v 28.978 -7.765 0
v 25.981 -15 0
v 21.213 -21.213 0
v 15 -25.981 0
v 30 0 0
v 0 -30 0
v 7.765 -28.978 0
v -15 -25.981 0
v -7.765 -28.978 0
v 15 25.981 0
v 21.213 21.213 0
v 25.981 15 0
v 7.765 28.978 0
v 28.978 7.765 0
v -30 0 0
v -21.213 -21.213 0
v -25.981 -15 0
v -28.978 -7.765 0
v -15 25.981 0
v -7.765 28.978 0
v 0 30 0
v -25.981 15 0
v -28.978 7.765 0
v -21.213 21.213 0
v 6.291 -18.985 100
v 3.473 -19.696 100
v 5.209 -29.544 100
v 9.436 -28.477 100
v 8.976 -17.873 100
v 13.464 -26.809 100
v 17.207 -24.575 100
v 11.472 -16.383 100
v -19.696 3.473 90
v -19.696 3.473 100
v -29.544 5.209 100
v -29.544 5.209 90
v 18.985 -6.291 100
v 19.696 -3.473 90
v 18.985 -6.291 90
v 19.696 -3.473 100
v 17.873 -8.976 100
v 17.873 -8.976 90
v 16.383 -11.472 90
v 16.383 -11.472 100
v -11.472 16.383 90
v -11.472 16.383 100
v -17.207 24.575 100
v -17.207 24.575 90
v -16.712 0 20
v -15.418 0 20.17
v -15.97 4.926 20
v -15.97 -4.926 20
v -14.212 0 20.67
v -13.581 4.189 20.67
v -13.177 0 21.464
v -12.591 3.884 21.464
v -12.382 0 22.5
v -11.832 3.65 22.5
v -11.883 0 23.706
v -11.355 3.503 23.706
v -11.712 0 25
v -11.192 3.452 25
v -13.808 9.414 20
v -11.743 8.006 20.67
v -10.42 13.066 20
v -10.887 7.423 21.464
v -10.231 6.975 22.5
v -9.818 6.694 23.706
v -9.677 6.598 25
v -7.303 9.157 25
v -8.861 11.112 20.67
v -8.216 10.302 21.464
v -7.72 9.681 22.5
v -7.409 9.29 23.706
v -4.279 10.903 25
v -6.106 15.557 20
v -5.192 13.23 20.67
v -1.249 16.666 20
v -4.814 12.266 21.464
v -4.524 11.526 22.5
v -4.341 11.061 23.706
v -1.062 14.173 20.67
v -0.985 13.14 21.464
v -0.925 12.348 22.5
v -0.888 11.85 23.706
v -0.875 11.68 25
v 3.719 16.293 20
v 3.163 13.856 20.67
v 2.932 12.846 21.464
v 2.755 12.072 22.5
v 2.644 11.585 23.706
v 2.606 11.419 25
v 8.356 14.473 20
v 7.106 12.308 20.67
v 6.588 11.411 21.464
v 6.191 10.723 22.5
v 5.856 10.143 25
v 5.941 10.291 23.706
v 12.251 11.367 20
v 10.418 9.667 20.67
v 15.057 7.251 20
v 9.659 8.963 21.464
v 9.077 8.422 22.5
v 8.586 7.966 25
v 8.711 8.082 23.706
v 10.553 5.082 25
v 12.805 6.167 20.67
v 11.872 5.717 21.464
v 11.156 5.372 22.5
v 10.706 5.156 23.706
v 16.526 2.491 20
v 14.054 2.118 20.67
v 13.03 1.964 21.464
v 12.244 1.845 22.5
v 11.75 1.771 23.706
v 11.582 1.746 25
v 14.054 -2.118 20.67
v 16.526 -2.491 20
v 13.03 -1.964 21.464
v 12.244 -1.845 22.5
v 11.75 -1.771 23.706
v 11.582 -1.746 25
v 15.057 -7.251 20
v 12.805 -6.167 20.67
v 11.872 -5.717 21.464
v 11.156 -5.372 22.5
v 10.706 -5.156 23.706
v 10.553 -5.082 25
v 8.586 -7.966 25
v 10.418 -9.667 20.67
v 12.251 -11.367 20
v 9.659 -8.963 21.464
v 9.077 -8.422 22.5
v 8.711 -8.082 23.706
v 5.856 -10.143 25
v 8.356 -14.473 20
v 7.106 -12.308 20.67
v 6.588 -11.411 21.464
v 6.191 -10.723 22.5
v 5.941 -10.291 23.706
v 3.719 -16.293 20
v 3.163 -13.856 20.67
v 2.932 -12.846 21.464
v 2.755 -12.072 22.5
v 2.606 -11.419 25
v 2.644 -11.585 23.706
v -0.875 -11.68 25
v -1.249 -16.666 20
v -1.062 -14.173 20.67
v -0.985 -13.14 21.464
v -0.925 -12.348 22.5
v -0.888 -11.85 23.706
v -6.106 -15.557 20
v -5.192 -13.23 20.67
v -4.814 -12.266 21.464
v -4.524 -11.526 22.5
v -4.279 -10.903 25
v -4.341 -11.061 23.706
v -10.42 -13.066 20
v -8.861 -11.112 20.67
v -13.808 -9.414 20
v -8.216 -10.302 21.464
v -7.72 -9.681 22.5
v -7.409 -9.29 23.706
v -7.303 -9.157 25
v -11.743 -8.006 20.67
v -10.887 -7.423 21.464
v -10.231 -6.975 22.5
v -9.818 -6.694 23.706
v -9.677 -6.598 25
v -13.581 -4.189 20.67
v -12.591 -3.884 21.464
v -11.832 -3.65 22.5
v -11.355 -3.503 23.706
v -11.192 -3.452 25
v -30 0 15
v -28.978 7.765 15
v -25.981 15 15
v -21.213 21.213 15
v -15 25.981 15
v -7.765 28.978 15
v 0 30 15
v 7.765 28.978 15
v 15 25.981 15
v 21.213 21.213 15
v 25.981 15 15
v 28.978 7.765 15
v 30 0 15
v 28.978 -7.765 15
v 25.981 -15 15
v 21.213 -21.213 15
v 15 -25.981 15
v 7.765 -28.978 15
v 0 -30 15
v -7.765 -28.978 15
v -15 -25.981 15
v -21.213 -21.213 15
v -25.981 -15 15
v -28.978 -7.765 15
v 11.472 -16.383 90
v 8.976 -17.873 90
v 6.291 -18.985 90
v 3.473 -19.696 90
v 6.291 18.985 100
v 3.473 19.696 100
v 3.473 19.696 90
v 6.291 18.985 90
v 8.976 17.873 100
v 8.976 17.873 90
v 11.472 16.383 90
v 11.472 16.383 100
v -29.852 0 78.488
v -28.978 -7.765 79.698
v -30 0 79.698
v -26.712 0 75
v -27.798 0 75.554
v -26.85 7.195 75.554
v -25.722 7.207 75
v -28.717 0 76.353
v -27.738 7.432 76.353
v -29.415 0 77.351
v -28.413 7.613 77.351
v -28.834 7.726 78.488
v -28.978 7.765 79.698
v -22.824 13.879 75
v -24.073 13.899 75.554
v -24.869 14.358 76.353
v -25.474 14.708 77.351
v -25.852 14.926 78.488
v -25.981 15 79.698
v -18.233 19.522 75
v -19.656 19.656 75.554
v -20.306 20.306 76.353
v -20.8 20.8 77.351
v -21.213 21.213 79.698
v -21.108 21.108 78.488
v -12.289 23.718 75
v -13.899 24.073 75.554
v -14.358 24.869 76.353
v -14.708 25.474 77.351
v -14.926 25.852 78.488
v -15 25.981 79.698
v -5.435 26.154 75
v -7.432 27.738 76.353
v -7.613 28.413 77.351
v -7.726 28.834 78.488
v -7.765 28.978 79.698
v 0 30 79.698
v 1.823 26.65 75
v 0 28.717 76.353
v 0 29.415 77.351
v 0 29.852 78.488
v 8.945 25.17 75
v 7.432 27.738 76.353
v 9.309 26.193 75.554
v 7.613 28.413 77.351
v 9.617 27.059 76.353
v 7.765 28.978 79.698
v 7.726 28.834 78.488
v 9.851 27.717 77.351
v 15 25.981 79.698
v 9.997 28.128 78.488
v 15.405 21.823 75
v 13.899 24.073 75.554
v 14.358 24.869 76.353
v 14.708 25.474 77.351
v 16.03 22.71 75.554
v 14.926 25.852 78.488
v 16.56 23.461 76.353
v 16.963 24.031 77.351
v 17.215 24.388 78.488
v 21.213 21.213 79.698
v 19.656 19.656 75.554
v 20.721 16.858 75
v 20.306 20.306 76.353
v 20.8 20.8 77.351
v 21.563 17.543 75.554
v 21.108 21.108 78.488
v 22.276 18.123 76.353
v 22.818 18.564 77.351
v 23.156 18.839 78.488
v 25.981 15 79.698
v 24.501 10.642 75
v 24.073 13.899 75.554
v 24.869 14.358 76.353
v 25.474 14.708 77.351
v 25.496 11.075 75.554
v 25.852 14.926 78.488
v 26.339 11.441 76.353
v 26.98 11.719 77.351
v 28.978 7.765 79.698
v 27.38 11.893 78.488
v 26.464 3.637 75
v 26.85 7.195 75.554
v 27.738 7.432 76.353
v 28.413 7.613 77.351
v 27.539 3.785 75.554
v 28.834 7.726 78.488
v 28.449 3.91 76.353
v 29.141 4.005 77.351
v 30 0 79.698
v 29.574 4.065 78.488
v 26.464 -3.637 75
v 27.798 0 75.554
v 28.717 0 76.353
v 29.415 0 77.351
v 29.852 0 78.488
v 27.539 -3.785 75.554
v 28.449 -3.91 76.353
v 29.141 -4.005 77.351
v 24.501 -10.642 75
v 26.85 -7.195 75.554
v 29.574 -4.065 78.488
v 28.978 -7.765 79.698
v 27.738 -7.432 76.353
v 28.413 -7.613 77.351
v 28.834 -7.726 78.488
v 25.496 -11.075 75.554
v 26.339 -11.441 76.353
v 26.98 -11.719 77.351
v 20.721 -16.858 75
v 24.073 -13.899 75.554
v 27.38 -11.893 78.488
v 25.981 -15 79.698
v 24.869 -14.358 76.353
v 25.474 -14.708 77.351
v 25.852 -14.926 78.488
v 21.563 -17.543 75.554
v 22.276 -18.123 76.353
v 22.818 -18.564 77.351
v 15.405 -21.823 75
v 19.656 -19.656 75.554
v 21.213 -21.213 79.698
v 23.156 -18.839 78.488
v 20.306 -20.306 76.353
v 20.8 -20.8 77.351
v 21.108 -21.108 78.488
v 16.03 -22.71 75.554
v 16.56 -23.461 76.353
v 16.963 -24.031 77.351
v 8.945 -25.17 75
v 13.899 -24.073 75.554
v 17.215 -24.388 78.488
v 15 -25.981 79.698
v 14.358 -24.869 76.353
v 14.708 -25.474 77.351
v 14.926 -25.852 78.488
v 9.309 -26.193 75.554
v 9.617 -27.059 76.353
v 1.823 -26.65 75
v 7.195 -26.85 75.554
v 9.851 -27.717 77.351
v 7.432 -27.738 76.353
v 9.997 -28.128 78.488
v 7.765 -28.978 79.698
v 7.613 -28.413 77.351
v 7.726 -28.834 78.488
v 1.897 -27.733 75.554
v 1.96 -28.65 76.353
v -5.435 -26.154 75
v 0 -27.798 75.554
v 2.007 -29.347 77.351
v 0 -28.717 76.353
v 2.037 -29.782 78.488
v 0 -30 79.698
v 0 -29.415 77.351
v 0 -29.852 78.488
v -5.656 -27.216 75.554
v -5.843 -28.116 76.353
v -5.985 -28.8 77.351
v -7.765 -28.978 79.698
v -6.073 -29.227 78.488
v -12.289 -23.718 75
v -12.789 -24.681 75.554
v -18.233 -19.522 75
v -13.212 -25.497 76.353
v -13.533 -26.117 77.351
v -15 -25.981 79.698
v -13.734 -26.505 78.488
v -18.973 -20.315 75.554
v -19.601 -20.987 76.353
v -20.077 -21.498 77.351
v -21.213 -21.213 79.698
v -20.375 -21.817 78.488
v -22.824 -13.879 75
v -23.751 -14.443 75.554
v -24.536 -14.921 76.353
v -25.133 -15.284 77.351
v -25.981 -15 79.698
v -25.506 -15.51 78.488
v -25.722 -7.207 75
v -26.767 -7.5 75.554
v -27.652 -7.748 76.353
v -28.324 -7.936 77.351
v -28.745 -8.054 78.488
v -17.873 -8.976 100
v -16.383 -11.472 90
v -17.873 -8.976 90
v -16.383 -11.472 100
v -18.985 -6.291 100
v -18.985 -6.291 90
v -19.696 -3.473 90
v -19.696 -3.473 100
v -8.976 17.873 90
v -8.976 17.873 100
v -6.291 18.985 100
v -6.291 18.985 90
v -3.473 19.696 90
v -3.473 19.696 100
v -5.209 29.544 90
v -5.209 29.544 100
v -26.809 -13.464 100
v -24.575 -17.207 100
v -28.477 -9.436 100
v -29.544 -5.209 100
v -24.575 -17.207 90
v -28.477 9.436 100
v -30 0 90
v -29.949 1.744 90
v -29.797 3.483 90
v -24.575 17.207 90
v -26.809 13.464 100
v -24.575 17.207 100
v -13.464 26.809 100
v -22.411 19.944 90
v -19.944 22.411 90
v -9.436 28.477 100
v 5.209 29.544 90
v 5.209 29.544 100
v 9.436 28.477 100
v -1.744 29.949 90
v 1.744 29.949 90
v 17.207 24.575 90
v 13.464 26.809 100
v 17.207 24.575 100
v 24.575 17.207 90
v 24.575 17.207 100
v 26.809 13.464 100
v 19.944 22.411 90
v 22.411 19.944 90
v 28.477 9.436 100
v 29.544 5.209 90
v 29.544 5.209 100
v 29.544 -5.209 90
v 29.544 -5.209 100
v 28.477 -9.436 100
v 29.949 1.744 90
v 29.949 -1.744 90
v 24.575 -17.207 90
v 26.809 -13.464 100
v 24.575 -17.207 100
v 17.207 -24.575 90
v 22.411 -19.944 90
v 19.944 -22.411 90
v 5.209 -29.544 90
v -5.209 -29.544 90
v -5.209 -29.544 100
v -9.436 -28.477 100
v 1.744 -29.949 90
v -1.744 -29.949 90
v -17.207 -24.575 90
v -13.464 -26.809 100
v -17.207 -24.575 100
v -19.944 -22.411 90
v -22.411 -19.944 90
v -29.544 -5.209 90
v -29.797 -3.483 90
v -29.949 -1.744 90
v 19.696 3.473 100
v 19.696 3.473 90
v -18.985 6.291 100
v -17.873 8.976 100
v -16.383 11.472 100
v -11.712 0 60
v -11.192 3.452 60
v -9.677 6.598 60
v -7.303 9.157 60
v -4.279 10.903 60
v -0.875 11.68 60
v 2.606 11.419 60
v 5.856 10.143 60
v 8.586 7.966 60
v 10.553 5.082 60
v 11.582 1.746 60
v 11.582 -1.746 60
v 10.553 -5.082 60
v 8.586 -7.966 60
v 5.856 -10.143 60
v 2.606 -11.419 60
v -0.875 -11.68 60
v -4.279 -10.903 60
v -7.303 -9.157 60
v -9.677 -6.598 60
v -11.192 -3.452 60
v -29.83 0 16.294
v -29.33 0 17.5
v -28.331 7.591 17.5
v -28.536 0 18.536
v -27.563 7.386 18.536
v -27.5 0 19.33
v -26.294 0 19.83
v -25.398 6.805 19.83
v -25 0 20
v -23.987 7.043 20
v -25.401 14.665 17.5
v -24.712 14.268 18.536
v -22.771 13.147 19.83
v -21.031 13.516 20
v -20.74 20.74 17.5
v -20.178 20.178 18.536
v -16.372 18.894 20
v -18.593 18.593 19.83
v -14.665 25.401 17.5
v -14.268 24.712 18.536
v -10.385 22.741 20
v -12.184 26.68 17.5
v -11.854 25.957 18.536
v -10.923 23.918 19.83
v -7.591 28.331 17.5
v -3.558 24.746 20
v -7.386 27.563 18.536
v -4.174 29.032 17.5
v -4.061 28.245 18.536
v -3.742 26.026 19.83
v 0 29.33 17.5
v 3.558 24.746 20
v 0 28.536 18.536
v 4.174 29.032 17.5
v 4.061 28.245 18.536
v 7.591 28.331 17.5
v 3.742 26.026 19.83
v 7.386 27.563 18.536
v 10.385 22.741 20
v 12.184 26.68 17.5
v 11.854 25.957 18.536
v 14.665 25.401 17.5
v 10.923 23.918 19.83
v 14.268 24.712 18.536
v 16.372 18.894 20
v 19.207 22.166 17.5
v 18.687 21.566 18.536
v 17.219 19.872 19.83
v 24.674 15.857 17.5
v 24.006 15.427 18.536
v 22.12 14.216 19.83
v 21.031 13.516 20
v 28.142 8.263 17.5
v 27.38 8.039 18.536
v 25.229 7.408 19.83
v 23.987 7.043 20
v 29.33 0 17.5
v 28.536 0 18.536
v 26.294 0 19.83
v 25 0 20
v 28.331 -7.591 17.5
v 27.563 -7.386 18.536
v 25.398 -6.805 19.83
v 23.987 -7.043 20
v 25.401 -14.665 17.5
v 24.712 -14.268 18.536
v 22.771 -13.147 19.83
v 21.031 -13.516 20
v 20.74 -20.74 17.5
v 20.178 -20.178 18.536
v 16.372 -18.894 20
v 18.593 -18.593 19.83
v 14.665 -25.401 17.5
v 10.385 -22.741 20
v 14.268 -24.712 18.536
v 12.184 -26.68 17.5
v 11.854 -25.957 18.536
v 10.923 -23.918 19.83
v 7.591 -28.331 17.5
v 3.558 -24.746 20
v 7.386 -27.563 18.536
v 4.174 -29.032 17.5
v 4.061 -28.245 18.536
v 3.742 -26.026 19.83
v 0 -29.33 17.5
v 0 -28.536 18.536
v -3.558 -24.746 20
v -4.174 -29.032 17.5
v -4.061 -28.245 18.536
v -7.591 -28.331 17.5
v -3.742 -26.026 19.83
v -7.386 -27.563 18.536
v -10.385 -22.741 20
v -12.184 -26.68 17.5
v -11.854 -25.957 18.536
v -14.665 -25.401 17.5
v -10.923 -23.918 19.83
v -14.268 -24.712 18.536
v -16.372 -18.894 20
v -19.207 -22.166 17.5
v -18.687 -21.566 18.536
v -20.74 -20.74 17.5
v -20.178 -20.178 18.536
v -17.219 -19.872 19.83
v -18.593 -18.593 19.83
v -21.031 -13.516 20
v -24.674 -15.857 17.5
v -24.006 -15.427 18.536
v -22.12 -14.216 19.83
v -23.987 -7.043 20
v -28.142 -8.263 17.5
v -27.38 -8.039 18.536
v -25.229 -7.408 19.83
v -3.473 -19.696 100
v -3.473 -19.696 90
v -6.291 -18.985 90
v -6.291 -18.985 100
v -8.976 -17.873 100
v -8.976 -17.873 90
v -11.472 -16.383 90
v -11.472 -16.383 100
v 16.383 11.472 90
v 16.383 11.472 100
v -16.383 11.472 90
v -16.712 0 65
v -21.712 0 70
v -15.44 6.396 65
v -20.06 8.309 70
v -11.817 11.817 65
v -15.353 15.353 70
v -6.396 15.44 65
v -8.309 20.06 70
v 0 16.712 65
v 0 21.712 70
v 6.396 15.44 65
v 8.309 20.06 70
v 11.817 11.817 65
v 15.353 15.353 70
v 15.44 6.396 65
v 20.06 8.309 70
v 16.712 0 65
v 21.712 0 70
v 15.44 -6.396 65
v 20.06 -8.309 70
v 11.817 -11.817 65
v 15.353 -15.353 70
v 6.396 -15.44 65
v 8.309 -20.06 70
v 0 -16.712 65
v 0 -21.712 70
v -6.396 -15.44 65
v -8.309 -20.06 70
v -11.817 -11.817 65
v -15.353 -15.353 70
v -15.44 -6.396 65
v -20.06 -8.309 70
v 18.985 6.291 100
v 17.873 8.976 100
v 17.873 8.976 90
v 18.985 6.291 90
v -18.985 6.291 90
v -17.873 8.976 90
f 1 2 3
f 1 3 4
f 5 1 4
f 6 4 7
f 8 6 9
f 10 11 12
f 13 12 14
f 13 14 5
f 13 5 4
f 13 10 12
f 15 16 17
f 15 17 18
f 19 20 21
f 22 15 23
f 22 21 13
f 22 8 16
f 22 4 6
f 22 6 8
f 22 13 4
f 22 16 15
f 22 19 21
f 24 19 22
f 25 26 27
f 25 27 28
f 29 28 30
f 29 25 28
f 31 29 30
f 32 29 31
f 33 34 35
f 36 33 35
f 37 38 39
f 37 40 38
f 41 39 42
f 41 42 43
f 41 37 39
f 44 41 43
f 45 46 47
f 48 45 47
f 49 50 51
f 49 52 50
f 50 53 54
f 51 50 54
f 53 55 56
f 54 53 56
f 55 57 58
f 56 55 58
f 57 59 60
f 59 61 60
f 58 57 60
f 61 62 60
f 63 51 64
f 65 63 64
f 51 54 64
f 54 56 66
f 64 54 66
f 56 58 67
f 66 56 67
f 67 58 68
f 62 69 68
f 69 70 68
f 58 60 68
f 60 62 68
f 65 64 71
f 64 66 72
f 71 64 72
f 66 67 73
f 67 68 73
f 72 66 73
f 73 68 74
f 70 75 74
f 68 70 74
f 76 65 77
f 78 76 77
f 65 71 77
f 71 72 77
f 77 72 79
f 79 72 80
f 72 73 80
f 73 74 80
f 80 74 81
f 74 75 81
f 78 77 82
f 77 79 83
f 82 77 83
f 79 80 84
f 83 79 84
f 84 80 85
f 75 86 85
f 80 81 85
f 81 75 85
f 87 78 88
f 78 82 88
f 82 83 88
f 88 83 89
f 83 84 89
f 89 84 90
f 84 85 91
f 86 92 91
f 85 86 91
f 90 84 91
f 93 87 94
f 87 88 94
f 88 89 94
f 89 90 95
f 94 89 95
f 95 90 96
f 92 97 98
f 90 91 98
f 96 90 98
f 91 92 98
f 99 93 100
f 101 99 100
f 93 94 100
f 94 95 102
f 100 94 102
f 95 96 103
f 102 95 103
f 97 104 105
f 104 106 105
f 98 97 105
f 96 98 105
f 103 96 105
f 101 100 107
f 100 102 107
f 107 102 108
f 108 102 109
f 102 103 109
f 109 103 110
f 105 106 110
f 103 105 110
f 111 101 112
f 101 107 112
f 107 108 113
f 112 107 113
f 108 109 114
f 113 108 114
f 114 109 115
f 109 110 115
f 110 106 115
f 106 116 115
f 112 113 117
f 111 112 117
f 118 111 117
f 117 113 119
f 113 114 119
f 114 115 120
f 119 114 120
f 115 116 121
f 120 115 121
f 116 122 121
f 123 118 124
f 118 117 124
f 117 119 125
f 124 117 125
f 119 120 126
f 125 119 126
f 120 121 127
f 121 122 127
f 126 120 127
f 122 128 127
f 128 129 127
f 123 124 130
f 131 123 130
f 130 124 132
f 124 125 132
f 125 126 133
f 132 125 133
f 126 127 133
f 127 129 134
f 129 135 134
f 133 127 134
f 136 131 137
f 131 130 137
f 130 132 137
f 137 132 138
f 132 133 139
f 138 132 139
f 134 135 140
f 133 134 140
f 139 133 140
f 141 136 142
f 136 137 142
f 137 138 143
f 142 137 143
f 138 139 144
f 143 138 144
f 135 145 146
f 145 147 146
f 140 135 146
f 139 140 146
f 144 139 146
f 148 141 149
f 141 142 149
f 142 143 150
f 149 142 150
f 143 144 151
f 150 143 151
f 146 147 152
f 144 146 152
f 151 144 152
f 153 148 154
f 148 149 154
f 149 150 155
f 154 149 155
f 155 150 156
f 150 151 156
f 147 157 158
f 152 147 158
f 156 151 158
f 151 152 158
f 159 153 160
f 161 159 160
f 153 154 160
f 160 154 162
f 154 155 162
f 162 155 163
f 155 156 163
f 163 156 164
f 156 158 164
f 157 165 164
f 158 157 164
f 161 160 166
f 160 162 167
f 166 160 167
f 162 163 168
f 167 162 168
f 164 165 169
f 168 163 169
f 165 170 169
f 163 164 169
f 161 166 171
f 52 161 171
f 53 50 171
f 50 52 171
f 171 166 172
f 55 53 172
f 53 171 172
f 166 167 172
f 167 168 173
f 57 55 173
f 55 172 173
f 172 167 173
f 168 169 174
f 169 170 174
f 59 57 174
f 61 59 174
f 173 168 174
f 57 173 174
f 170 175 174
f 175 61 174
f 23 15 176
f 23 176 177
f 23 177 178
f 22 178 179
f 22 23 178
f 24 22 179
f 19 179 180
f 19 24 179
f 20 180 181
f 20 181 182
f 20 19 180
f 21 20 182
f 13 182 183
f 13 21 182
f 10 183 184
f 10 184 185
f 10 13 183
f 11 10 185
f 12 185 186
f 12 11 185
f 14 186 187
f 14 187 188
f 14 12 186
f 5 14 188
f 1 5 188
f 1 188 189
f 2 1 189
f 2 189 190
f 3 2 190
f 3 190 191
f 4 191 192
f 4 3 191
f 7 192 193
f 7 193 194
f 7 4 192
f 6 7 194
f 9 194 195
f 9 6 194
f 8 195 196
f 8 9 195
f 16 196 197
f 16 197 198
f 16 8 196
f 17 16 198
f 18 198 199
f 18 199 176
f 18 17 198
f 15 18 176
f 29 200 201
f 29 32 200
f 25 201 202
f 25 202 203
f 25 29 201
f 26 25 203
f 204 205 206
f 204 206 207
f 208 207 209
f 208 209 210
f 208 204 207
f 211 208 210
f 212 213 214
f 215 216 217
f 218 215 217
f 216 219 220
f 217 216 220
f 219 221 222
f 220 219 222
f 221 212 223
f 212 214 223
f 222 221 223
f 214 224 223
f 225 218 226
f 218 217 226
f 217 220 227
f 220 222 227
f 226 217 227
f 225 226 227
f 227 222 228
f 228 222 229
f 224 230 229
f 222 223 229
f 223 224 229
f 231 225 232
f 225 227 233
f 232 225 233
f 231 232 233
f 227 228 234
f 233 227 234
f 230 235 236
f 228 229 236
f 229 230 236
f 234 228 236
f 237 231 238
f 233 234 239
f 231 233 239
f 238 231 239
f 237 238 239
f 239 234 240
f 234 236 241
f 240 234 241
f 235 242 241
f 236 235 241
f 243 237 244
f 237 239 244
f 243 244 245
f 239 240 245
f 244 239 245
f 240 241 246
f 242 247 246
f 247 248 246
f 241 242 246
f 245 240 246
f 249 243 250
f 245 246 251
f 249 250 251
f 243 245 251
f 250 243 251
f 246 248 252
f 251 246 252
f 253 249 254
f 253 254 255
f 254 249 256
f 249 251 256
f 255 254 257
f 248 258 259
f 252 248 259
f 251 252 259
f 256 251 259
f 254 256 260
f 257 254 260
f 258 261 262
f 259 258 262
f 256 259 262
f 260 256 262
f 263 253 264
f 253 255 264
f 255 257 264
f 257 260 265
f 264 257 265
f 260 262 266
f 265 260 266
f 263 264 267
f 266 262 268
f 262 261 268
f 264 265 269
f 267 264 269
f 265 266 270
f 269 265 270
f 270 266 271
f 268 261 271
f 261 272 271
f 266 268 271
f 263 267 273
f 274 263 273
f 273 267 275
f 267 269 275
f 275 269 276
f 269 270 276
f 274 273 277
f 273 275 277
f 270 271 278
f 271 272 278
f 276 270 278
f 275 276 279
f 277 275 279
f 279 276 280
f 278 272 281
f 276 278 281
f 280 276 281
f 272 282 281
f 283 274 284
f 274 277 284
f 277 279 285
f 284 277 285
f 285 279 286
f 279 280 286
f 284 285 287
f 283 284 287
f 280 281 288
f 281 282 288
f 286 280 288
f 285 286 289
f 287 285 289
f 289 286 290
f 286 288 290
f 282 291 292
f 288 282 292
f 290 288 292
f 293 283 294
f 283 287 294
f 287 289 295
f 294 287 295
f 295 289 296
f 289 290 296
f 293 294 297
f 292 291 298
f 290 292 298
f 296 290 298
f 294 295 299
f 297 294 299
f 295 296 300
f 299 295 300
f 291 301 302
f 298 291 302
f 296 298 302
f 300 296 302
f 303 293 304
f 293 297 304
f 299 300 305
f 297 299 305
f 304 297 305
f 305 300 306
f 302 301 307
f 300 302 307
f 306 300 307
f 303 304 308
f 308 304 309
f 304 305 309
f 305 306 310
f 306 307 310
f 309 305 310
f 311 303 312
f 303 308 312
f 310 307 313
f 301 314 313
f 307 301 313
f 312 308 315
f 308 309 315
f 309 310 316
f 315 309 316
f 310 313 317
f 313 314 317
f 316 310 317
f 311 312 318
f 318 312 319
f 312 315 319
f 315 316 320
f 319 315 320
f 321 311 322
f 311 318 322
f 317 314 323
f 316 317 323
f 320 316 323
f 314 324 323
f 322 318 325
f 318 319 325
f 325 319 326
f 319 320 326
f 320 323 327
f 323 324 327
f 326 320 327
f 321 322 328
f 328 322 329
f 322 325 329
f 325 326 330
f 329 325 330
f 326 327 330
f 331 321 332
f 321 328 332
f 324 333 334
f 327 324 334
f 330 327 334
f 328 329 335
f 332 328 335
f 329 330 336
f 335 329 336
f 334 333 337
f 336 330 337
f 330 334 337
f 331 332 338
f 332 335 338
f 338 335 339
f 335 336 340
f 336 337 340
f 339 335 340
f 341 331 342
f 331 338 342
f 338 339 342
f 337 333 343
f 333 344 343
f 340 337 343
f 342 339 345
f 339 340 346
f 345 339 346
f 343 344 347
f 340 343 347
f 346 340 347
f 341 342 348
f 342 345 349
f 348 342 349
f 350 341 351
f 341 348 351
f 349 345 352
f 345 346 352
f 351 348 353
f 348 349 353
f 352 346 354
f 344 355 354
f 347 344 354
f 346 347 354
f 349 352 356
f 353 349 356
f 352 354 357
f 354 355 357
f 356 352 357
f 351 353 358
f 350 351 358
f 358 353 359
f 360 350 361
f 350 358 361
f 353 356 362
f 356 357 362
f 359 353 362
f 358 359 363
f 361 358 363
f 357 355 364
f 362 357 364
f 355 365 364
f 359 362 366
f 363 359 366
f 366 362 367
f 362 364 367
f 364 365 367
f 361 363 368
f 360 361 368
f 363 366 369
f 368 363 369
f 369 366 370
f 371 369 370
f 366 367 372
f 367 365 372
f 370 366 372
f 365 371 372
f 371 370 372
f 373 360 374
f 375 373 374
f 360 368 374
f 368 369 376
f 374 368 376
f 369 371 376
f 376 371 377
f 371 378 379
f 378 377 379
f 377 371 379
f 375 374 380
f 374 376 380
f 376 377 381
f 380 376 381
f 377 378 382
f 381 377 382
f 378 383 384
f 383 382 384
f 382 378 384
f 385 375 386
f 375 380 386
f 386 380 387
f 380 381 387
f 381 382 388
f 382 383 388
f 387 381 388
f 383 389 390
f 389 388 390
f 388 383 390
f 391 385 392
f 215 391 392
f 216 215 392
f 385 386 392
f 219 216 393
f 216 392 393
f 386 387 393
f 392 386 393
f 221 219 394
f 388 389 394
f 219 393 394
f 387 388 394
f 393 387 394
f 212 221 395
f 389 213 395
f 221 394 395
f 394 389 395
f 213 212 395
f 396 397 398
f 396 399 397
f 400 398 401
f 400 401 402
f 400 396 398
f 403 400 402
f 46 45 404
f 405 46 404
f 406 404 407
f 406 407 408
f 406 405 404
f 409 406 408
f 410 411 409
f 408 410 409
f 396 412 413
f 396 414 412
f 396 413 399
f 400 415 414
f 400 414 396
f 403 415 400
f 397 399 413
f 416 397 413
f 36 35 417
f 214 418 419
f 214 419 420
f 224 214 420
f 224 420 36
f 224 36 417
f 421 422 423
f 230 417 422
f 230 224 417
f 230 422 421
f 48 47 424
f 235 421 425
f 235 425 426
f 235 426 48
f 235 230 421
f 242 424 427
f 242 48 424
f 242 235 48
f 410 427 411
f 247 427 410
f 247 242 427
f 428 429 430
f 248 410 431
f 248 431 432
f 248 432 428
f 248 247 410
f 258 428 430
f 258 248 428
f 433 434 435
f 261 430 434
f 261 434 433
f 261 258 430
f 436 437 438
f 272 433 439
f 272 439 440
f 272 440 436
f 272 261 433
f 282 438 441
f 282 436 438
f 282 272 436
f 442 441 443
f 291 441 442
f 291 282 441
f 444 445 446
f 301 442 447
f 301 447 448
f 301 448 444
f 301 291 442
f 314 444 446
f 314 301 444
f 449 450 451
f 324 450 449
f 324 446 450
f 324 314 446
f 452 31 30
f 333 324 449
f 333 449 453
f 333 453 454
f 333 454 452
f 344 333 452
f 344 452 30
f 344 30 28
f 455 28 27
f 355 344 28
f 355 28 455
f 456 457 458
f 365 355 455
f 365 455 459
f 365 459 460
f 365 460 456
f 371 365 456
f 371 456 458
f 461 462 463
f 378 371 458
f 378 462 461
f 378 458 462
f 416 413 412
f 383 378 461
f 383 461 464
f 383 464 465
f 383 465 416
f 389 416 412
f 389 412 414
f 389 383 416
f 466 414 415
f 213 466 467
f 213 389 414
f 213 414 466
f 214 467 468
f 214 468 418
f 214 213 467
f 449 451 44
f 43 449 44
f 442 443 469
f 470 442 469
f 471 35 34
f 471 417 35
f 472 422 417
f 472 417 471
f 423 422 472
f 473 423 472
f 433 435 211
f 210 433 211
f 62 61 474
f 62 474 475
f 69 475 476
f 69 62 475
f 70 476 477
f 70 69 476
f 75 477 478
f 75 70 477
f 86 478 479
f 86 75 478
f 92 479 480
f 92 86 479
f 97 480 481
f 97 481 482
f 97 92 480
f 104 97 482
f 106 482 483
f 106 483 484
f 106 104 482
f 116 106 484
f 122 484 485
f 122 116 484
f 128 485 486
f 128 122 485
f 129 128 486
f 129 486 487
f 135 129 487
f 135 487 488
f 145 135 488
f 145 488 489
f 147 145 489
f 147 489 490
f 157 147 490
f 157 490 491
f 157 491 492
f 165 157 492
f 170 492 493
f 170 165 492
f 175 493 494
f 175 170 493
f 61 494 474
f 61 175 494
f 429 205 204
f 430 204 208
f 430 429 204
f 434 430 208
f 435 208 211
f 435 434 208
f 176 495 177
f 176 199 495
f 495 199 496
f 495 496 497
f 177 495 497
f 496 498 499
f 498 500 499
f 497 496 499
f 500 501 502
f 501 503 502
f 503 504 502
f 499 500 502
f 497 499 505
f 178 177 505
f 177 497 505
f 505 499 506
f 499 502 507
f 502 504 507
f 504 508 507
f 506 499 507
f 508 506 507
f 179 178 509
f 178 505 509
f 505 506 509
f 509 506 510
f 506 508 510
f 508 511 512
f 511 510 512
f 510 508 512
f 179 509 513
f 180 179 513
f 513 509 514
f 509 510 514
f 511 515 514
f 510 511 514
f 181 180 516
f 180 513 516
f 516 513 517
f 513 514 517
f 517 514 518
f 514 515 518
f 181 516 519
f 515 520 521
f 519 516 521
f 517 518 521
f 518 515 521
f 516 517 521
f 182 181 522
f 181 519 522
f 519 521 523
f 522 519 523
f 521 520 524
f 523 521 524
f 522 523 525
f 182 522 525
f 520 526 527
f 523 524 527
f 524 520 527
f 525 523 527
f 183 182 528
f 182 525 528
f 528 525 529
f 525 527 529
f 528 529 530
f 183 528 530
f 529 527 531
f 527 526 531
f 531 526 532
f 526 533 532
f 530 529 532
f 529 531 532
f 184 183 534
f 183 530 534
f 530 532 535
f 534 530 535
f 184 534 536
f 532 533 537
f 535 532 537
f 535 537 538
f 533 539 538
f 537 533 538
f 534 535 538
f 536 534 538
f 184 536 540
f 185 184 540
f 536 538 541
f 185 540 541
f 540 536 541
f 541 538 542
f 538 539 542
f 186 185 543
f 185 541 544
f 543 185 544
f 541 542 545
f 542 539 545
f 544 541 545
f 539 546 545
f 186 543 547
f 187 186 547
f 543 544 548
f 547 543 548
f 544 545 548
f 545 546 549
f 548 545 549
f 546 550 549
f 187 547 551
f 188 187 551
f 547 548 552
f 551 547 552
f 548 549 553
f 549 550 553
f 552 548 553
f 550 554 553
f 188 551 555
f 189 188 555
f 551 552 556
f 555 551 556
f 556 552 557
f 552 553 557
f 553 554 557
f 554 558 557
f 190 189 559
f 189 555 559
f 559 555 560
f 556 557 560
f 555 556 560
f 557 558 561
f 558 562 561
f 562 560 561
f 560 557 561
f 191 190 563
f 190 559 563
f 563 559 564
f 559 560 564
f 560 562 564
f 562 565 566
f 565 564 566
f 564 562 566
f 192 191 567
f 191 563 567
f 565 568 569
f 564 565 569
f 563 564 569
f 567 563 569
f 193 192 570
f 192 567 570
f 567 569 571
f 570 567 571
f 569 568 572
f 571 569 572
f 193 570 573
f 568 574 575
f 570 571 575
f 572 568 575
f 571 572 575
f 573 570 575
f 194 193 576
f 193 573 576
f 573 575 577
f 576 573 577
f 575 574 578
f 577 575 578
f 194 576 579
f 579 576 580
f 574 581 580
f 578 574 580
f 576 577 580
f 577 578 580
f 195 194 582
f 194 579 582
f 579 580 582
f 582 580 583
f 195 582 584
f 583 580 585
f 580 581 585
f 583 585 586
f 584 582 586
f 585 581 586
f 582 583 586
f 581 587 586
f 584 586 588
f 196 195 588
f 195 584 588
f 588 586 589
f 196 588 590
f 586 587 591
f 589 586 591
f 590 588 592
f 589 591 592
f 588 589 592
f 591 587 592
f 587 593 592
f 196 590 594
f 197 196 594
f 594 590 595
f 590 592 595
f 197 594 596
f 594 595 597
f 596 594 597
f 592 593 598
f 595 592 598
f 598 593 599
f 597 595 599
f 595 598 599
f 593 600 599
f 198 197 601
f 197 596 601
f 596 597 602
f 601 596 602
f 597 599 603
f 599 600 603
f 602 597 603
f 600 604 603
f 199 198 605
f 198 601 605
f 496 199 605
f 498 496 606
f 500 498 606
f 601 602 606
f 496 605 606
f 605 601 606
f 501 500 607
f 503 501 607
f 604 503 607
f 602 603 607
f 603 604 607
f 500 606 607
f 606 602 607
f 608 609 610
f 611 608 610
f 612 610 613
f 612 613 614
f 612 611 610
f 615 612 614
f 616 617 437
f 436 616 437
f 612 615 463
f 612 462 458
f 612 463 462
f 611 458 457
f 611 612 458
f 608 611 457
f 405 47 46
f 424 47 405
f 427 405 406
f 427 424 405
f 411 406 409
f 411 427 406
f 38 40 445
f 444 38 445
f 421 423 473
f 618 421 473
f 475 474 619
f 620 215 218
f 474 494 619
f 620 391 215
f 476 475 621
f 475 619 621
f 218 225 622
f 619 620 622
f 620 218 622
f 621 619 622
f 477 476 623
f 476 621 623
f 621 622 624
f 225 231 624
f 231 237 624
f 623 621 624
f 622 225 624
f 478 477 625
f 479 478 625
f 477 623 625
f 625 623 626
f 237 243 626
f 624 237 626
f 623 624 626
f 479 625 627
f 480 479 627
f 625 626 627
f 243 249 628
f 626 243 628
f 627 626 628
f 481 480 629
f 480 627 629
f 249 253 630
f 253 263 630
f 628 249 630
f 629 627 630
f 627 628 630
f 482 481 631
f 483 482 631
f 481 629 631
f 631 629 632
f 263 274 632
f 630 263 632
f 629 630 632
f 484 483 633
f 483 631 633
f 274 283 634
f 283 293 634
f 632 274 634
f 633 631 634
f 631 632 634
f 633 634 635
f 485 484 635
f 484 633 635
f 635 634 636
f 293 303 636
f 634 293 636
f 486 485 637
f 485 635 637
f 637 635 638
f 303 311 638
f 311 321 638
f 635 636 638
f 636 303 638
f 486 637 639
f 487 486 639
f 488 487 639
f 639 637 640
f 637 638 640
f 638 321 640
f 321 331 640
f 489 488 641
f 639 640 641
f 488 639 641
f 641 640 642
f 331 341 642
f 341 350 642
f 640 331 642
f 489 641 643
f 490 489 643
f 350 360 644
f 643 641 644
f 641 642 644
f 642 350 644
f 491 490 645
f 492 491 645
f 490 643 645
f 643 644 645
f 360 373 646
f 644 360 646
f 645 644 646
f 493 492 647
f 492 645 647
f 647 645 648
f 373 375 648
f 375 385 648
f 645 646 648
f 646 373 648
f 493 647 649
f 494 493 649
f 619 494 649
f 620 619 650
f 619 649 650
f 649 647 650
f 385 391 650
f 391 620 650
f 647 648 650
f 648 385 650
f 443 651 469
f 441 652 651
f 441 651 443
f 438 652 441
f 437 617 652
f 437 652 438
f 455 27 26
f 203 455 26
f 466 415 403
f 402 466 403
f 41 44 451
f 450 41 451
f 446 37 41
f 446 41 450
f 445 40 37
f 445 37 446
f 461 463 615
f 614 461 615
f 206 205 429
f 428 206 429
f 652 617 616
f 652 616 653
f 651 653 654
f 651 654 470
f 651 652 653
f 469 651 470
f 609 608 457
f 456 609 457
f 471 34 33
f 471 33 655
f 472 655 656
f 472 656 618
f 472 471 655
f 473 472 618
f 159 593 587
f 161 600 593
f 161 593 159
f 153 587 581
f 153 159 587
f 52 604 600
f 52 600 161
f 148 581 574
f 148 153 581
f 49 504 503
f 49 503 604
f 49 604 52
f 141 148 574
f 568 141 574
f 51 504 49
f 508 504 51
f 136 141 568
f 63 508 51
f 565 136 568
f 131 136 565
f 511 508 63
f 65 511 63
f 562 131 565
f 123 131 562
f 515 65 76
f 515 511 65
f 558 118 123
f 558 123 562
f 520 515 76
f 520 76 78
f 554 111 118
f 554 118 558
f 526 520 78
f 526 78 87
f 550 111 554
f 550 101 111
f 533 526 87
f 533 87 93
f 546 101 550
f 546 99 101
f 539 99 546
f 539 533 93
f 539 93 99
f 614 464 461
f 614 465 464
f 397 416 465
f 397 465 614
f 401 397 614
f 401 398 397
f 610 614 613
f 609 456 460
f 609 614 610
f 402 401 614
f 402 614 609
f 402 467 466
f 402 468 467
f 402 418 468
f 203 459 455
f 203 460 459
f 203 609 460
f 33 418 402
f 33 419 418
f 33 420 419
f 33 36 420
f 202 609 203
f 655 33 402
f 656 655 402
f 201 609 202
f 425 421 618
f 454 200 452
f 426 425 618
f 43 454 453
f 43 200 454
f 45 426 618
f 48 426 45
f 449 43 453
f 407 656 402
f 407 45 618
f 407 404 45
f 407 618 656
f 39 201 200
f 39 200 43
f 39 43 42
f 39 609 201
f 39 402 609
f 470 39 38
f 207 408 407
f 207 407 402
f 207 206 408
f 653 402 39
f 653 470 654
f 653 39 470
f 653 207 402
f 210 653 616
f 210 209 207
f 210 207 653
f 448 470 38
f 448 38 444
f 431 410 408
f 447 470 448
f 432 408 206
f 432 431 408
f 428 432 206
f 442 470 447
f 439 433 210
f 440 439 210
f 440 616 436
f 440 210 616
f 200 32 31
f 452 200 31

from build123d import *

# Parameters (mm, degrees)
F3_DEPTH = 10
F4_R     = 5
F5_SIZE  = 15


# Not quite as in the source:
# - a fillet or chamfer that OpenCascade refuses, or shapes differently, is made with other operations: its cross-section is extruded or revolved along the edge and cut away or added


with BuildPart() as f1:
    # F0 (on Front) → F1 (revolve)
    with BuildSketch(Plane.XZ):
        Polygon((-30, 0), (0, 0), (0, 90), (-20, 90), (-20, 100), (-30, 100), (-30, 75), (-11.7123959959, 75), (-11.7123959959, 20), (-30, 20), align=None)
    revolve(axis=Axis((0, 0, 45), (0, 0, -1)))

    # F2 (on face) → F3 (cut)
    with BuildSketch(Plane.XY.offset(100)):
        with BuildLine():
            ThreePointArc((-3.2492678477, 18.4275136719), (0, 18.7117877734), (3.2492678477, 18.4275136719))
            Line((3.2492678477, 18.4275136719), (5.5579839553, 31.5208933594))
            ThreePointArc((5.5579839553, 31.5208933594), (0, 32.0071539476), (-5.5579839553, 31.5208933594))
            Line((-5.5579839553, 31.5208933594), (-3.2492678477, 18.4275136719))
        make_face()
        with BuildLine():
            ThreePointArc((-15.3277992068, 10.7326405488), (-13.2312320227, 13.2312320227), (-10.7326405488, 15.3277992068))
            Line((-10.7326405488, 15.3277992068), (-18.358549299, 26.218725588))
            ThreePointArc((-18.358549299, 26.218725588), (-22.6324756028, 22.6324756028), (-26.218725588, 18.358549299))
            Line((-26.218725588, 18.358549299), (-15.3277992068, 10.7326405488))
        make_face()
        with BuildLine():
            ThreePointArc((-18.4275136719, -3.2492678477), (-18.7117877734, 0), (-18.4275136719, 3.2492678477))
            Line((-18.4275136719, 3.2492678477), (-31.5208933594, 5.5579839553))
            ThreePointArc((-31.5208933594, 5.5579839553), (-32.0071539476, 0), (-31.5208933594, -5.5579839553))
            Line((-31.5208933594, -5.5579839553), (-18.4275136719, -3.2492678477))
        make_face()
        with BuildLine():
            ThreePointArc((-10.7326405488, -15.3277992068), (-13.2312320227, -13.2312320227), (-15.3277992068, -10.7326405488))
            Line((-15.3277992068, -10.7326405488), (-26.218725588, -18.358549299))
            ThreePointArc((-26.218725588, -18.358549299), (-22.6324756028, -22.6324756028), (-18.358549299, -26.218725588))
            Line((-18.358549299, -26.218725588), (-10.7326405488, -15.3277992068))
        make_face()
        with BuildLine():
            ThreePointArc((3.2492678477, -18.4275136719), (0, -18.7117877734), (-3.2492678477, -18.4275136719))
            Line((-3.2492678477, -18.4275136719), (-5.5579839553, -31.5208933594))
            ThreePointArc((-5.5579839553, -31.5208933594), (0, -32.0071539476), (5.5579839553, -31.5208933594))
            Line((5.5579839553, -31.5208933594), (3.2492678477, -18.4275136719))
        make_face()
        with BuildLine():
            ThreePointArc((15.3277992068, -10.7326405488), (13.2312320227, -13.2312320227), (10.7326405488, -15.3277992068))
            Line((10.7326405488, -15.3277992068), (18.358549299, -26.218725588))
            ThreePointArc((18.358549299, -26.218725588), (22.6324756028, -22.6324756028), (26.218725588, -18.358549299))
            Line((26.218725588, -18.358549299), (15.3277992068, -10.7326405488))
        make_face()
        with BuildLine():
            ThreePointArc((18.4275136719, 3.2492678477), (18.7117877734, 0), (18.4275136719, -3.2492678477))
            Line((18.4275136719, -3.2492678477), (31.5208933594, -5.5579839553))
            ThreePointArc((31.5208933594, -5.5579839553), (32.0071539476, 0), (31.5208933594, 5.5579839553))
            Line((31.5208933594, 5.5579839553), (18.4275136719, 3.2492678477))
        make_face()
        with BuildLine():
            ThreePointArc((10.7326405488, 15.3277992068), (13.2312320227, 13.2312320227), (15.3277992068, 10.7326405488))
            Line((15.3277992068, 10.7326405488), (26.218725588, 18.358549299))
            ThreePointArc((26.218725588, 18.358549299), (22.6324756028, 22.6324756028), (18.358549299, 26.218725588))
            Line((18.358549299, 26.218725588), (10.7326405488, 15.3277992068))
        make_face()
    extrude(amount=-F3_DEPTH, mode=Mode.SUBTRACT)

    # F4
    f4_edges = [f1.edges().sort_by_distance(p)[0] for p in [
        (11.712396, 0, 20),
        (30, 0, 20),
    ]]
    fillet(f4_edges, radius=F4_R)

    # F5
    f5_edges = [f1.edges().sort_by_distance(p)[0] for p in [
        (11.712396, 0, 75),
    ]]
    chamfer(f5_edges, length=F5_SIZE)

    # F6: fillet of radius 5 on 1 edges, made by hand

    # F6_s1 → F6_t2 (revolve, cut)
    with BuildSketch(Plane.XZ):
        with BuildLine():
            ThreePointArc((-26.7123959959, 75), (-29.0964606662, 76.8307454727), (-30, 79.6976270556))
            Line((-30, 79.6976270556), (-30.1, 79.6976270556))
            Line((-30.1, 79.6976270556), (-30.1, 75))
            Line((-30.1, 75), (-30, 74.9))
            ThreePointArc((-30, 74.9), (-28.3561979979, 74.9), (-26.7466439158, 74.9060474589))
            Line((-26.7466439158, 74.9060474589), (-26.7123959959, 75))
        make_face()
    revolve(axis=Axis((0, 0, 75), (0, 0, -1)), mode=Mode.SUBTRACT)


solid = f1.part
